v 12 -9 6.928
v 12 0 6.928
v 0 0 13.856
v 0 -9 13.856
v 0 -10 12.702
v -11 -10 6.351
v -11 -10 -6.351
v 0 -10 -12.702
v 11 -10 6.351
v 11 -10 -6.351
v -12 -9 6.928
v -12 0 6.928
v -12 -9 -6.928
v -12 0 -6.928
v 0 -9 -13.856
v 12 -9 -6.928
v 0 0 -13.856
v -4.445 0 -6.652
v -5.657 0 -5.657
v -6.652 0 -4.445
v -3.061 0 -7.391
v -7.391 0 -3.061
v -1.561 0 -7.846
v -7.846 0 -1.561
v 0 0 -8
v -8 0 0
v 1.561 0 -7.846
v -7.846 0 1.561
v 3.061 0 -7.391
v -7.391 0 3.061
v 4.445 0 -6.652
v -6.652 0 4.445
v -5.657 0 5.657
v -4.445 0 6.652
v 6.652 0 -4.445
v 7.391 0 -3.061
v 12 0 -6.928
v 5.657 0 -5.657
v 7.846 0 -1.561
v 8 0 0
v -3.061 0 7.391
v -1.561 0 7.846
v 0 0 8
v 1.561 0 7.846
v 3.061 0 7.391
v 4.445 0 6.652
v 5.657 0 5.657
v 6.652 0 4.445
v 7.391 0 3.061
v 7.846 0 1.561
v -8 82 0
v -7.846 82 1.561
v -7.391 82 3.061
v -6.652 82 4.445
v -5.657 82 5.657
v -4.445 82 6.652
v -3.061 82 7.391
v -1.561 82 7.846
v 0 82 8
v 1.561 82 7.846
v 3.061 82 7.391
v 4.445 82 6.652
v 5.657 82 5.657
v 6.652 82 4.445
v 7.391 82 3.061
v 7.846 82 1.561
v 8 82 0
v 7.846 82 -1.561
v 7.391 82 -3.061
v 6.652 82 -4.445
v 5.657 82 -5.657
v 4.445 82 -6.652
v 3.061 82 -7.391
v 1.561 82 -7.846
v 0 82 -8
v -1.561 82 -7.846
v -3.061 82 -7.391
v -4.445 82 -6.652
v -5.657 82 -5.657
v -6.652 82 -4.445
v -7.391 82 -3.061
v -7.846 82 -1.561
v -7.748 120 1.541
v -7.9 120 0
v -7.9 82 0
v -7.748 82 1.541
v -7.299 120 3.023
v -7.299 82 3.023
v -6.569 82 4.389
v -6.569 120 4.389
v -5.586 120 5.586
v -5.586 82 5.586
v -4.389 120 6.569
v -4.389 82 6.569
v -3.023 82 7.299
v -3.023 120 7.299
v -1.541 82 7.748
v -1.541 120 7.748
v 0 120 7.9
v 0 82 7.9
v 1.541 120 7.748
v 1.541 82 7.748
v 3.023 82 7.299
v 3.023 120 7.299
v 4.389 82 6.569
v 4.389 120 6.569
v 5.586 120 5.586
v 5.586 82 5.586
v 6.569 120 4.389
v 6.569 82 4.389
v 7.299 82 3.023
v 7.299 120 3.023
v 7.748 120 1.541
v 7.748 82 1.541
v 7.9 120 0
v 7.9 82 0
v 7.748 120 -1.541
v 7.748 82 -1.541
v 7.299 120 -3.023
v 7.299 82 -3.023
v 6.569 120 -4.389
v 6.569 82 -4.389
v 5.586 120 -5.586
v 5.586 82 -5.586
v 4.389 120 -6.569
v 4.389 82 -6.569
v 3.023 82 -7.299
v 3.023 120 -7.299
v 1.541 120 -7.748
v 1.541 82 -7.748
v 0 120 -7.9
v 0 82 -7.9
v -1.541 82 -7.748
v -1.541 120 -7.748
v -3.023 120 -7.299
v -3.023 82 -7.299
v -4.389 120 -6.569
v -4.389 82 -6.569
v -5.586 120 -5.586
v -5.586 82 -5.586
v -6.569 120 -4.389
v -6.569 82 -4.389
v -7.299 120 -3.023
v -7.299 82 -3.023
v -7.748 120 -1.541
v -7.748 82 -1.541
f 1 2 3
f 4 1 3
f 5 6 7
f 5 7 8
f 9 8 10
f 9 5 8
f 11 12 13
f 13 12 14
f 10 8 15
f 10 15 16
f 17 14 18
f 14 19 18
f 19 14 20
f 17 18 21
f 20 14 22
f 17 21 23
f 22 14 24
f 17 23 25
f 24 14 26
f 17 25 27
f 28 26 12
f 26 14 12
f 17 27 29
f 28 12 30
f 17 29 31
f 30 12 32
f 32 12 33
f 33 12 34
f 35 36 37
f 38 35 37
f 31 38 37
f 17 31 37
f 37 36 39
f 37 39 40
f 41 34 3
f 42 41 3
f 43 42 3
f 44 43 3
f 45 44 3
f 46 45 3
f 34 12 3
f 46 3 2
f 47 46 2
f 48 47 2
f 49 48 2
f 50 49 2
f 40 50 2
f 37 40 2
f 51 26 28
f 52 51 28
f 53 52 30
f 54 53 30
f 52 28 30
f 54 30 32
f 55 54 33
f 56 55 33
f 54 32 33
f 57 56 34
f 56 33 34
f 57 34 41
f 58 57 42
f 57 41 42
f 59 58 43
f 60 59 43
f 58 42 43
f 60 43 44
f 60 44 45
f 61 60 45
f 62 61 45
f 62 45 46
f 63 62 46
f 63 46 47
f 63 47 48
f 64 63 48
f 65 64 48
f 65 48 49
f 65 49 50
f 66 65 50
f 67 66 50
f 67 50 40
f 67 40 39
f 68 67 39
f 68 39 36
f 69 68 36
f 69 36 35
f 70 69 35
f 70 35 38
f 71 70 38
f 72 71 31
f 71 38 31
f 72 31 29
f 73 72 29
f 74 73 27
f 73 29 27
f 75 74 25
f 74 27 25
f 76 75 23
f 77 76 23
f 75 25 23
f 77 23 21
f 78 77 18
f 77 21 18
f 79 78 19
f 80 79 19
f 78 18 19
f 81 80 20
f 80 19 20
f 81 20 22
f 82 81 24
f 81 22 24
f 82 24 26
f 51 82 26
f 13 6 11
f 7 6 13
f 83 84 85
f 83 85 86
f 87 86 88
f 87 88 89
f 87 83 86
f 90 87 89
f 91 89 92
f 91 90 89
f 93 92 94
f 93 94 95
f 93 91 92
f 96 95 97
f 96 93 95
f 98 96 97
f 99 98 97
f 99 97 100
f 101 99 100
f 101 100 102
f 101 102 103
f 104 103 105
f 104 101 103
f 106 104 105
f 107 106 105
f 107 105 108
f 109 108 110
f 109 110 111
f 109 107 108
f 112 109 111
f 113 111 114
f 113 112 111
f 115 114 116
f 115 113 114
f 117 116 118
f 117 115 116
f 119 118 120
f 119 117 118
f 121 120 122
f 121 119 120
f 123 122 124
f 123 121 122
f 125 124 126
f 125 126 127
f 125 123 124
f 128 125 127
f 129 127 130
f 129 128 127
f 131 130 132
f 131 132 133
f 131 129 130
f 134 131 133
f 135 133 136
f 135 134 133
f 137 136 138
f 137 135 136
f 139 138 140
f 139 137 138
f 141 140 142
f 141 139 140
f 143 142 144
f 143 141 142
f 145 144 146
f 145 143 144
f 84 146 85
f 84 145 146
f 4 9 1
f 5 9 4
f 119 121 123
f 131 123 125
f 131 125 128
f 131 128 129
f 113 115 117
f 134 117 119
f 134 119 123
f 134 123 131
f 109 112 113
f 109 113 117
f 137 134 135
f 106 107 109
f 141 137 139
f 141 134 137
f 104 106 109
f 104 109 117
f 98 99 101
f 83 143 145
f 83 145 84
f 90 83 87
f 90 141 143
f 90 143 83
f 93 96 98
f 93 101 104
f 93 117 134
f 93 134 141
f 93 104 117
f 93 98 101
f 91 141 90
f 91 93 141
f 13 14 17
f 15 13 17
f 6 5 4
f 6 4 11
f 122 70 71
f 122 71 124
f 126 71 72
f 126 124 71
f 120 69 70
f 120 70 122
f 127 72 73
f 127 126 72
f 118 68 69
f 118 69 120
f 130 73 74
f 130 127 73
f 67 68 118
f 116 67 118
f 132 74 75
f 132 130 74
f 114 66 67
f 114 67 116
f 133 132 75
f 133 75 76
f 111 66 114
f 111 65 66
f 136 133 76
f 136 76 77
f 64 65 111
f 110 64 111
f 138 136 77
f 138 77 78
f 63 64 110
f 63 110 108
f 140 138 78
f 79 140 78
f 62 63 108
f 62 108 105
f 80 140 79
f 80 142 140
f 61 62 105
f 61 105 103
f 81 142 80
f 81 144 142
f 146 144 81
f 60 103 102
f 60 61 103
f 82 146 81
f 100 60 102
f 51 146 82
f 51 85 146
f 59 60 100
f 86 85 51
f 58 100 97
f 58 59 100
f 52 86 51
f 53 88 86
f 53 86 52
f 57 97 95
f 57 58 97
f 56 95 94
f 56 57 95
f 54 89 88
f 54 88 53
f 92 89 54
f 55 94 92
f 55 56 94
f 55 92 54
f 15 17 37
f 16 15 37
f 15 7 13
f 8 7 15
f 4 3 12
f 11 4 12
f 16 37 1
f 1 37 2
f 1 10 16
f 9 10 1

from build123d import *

# Parameters (mm, degrees)
F1_DEPTH = 10
F2_SIZE2 = 1
F2_SIZE  = 1
F3_R     = 8
F4_DEPTH = 120
F5_R     = 8
F5_R_2   = 7.9
F6_DEPTH = 38


with BuildPart() as f1:
    # F0 (on Front) → F1 (new body)
    with BuildSketch(Plane.XZ):
        Polygon((0, -13.856406), (12, -6.928203), (12, 6.928203), (0, 13.856406), (-12, 6.928203), (-12, -6.928203), align=None)
    extrude(amount=F1_DEPTH)

    # F2
    f2_edges = [f1.edges().sort_by_distance(p)[0] for p in [
        (6, -10, 10.392305),
        (-6, -10, 10.392305),
        (12, -10, 0),
        (6, -10, -10.392305),
        (-6, -10, -10.392305),
        (-12, -10, 0),
    ]]
    chamfer(f2_edges, length=F2_SIZE, length2=F2_SIZE2)

    # F3 (on face) → F4 (join)
    with BuildSketch(Plane(origin=(0, 0, 0), x_dir=(-1, 0, 0), z_dir=(0, 1, 0))):
        Circle(F3_R)
    extrude(amount=F4_DEPTH)

    # F5 (on face) → F6 (cut)
    with BuildSketch(Plane(origin=(0, 120, 0), x_dir=(-1, 0, 0), z_dir=(0, 1, 0))):
        Circle(F5_R)
        Circle(F5_R_2, mode=Mode.SUBTRACT)
    extrude(amount=-F6_DEPTH, mode=Mode.SUBTRACT)


solid = f1.part
